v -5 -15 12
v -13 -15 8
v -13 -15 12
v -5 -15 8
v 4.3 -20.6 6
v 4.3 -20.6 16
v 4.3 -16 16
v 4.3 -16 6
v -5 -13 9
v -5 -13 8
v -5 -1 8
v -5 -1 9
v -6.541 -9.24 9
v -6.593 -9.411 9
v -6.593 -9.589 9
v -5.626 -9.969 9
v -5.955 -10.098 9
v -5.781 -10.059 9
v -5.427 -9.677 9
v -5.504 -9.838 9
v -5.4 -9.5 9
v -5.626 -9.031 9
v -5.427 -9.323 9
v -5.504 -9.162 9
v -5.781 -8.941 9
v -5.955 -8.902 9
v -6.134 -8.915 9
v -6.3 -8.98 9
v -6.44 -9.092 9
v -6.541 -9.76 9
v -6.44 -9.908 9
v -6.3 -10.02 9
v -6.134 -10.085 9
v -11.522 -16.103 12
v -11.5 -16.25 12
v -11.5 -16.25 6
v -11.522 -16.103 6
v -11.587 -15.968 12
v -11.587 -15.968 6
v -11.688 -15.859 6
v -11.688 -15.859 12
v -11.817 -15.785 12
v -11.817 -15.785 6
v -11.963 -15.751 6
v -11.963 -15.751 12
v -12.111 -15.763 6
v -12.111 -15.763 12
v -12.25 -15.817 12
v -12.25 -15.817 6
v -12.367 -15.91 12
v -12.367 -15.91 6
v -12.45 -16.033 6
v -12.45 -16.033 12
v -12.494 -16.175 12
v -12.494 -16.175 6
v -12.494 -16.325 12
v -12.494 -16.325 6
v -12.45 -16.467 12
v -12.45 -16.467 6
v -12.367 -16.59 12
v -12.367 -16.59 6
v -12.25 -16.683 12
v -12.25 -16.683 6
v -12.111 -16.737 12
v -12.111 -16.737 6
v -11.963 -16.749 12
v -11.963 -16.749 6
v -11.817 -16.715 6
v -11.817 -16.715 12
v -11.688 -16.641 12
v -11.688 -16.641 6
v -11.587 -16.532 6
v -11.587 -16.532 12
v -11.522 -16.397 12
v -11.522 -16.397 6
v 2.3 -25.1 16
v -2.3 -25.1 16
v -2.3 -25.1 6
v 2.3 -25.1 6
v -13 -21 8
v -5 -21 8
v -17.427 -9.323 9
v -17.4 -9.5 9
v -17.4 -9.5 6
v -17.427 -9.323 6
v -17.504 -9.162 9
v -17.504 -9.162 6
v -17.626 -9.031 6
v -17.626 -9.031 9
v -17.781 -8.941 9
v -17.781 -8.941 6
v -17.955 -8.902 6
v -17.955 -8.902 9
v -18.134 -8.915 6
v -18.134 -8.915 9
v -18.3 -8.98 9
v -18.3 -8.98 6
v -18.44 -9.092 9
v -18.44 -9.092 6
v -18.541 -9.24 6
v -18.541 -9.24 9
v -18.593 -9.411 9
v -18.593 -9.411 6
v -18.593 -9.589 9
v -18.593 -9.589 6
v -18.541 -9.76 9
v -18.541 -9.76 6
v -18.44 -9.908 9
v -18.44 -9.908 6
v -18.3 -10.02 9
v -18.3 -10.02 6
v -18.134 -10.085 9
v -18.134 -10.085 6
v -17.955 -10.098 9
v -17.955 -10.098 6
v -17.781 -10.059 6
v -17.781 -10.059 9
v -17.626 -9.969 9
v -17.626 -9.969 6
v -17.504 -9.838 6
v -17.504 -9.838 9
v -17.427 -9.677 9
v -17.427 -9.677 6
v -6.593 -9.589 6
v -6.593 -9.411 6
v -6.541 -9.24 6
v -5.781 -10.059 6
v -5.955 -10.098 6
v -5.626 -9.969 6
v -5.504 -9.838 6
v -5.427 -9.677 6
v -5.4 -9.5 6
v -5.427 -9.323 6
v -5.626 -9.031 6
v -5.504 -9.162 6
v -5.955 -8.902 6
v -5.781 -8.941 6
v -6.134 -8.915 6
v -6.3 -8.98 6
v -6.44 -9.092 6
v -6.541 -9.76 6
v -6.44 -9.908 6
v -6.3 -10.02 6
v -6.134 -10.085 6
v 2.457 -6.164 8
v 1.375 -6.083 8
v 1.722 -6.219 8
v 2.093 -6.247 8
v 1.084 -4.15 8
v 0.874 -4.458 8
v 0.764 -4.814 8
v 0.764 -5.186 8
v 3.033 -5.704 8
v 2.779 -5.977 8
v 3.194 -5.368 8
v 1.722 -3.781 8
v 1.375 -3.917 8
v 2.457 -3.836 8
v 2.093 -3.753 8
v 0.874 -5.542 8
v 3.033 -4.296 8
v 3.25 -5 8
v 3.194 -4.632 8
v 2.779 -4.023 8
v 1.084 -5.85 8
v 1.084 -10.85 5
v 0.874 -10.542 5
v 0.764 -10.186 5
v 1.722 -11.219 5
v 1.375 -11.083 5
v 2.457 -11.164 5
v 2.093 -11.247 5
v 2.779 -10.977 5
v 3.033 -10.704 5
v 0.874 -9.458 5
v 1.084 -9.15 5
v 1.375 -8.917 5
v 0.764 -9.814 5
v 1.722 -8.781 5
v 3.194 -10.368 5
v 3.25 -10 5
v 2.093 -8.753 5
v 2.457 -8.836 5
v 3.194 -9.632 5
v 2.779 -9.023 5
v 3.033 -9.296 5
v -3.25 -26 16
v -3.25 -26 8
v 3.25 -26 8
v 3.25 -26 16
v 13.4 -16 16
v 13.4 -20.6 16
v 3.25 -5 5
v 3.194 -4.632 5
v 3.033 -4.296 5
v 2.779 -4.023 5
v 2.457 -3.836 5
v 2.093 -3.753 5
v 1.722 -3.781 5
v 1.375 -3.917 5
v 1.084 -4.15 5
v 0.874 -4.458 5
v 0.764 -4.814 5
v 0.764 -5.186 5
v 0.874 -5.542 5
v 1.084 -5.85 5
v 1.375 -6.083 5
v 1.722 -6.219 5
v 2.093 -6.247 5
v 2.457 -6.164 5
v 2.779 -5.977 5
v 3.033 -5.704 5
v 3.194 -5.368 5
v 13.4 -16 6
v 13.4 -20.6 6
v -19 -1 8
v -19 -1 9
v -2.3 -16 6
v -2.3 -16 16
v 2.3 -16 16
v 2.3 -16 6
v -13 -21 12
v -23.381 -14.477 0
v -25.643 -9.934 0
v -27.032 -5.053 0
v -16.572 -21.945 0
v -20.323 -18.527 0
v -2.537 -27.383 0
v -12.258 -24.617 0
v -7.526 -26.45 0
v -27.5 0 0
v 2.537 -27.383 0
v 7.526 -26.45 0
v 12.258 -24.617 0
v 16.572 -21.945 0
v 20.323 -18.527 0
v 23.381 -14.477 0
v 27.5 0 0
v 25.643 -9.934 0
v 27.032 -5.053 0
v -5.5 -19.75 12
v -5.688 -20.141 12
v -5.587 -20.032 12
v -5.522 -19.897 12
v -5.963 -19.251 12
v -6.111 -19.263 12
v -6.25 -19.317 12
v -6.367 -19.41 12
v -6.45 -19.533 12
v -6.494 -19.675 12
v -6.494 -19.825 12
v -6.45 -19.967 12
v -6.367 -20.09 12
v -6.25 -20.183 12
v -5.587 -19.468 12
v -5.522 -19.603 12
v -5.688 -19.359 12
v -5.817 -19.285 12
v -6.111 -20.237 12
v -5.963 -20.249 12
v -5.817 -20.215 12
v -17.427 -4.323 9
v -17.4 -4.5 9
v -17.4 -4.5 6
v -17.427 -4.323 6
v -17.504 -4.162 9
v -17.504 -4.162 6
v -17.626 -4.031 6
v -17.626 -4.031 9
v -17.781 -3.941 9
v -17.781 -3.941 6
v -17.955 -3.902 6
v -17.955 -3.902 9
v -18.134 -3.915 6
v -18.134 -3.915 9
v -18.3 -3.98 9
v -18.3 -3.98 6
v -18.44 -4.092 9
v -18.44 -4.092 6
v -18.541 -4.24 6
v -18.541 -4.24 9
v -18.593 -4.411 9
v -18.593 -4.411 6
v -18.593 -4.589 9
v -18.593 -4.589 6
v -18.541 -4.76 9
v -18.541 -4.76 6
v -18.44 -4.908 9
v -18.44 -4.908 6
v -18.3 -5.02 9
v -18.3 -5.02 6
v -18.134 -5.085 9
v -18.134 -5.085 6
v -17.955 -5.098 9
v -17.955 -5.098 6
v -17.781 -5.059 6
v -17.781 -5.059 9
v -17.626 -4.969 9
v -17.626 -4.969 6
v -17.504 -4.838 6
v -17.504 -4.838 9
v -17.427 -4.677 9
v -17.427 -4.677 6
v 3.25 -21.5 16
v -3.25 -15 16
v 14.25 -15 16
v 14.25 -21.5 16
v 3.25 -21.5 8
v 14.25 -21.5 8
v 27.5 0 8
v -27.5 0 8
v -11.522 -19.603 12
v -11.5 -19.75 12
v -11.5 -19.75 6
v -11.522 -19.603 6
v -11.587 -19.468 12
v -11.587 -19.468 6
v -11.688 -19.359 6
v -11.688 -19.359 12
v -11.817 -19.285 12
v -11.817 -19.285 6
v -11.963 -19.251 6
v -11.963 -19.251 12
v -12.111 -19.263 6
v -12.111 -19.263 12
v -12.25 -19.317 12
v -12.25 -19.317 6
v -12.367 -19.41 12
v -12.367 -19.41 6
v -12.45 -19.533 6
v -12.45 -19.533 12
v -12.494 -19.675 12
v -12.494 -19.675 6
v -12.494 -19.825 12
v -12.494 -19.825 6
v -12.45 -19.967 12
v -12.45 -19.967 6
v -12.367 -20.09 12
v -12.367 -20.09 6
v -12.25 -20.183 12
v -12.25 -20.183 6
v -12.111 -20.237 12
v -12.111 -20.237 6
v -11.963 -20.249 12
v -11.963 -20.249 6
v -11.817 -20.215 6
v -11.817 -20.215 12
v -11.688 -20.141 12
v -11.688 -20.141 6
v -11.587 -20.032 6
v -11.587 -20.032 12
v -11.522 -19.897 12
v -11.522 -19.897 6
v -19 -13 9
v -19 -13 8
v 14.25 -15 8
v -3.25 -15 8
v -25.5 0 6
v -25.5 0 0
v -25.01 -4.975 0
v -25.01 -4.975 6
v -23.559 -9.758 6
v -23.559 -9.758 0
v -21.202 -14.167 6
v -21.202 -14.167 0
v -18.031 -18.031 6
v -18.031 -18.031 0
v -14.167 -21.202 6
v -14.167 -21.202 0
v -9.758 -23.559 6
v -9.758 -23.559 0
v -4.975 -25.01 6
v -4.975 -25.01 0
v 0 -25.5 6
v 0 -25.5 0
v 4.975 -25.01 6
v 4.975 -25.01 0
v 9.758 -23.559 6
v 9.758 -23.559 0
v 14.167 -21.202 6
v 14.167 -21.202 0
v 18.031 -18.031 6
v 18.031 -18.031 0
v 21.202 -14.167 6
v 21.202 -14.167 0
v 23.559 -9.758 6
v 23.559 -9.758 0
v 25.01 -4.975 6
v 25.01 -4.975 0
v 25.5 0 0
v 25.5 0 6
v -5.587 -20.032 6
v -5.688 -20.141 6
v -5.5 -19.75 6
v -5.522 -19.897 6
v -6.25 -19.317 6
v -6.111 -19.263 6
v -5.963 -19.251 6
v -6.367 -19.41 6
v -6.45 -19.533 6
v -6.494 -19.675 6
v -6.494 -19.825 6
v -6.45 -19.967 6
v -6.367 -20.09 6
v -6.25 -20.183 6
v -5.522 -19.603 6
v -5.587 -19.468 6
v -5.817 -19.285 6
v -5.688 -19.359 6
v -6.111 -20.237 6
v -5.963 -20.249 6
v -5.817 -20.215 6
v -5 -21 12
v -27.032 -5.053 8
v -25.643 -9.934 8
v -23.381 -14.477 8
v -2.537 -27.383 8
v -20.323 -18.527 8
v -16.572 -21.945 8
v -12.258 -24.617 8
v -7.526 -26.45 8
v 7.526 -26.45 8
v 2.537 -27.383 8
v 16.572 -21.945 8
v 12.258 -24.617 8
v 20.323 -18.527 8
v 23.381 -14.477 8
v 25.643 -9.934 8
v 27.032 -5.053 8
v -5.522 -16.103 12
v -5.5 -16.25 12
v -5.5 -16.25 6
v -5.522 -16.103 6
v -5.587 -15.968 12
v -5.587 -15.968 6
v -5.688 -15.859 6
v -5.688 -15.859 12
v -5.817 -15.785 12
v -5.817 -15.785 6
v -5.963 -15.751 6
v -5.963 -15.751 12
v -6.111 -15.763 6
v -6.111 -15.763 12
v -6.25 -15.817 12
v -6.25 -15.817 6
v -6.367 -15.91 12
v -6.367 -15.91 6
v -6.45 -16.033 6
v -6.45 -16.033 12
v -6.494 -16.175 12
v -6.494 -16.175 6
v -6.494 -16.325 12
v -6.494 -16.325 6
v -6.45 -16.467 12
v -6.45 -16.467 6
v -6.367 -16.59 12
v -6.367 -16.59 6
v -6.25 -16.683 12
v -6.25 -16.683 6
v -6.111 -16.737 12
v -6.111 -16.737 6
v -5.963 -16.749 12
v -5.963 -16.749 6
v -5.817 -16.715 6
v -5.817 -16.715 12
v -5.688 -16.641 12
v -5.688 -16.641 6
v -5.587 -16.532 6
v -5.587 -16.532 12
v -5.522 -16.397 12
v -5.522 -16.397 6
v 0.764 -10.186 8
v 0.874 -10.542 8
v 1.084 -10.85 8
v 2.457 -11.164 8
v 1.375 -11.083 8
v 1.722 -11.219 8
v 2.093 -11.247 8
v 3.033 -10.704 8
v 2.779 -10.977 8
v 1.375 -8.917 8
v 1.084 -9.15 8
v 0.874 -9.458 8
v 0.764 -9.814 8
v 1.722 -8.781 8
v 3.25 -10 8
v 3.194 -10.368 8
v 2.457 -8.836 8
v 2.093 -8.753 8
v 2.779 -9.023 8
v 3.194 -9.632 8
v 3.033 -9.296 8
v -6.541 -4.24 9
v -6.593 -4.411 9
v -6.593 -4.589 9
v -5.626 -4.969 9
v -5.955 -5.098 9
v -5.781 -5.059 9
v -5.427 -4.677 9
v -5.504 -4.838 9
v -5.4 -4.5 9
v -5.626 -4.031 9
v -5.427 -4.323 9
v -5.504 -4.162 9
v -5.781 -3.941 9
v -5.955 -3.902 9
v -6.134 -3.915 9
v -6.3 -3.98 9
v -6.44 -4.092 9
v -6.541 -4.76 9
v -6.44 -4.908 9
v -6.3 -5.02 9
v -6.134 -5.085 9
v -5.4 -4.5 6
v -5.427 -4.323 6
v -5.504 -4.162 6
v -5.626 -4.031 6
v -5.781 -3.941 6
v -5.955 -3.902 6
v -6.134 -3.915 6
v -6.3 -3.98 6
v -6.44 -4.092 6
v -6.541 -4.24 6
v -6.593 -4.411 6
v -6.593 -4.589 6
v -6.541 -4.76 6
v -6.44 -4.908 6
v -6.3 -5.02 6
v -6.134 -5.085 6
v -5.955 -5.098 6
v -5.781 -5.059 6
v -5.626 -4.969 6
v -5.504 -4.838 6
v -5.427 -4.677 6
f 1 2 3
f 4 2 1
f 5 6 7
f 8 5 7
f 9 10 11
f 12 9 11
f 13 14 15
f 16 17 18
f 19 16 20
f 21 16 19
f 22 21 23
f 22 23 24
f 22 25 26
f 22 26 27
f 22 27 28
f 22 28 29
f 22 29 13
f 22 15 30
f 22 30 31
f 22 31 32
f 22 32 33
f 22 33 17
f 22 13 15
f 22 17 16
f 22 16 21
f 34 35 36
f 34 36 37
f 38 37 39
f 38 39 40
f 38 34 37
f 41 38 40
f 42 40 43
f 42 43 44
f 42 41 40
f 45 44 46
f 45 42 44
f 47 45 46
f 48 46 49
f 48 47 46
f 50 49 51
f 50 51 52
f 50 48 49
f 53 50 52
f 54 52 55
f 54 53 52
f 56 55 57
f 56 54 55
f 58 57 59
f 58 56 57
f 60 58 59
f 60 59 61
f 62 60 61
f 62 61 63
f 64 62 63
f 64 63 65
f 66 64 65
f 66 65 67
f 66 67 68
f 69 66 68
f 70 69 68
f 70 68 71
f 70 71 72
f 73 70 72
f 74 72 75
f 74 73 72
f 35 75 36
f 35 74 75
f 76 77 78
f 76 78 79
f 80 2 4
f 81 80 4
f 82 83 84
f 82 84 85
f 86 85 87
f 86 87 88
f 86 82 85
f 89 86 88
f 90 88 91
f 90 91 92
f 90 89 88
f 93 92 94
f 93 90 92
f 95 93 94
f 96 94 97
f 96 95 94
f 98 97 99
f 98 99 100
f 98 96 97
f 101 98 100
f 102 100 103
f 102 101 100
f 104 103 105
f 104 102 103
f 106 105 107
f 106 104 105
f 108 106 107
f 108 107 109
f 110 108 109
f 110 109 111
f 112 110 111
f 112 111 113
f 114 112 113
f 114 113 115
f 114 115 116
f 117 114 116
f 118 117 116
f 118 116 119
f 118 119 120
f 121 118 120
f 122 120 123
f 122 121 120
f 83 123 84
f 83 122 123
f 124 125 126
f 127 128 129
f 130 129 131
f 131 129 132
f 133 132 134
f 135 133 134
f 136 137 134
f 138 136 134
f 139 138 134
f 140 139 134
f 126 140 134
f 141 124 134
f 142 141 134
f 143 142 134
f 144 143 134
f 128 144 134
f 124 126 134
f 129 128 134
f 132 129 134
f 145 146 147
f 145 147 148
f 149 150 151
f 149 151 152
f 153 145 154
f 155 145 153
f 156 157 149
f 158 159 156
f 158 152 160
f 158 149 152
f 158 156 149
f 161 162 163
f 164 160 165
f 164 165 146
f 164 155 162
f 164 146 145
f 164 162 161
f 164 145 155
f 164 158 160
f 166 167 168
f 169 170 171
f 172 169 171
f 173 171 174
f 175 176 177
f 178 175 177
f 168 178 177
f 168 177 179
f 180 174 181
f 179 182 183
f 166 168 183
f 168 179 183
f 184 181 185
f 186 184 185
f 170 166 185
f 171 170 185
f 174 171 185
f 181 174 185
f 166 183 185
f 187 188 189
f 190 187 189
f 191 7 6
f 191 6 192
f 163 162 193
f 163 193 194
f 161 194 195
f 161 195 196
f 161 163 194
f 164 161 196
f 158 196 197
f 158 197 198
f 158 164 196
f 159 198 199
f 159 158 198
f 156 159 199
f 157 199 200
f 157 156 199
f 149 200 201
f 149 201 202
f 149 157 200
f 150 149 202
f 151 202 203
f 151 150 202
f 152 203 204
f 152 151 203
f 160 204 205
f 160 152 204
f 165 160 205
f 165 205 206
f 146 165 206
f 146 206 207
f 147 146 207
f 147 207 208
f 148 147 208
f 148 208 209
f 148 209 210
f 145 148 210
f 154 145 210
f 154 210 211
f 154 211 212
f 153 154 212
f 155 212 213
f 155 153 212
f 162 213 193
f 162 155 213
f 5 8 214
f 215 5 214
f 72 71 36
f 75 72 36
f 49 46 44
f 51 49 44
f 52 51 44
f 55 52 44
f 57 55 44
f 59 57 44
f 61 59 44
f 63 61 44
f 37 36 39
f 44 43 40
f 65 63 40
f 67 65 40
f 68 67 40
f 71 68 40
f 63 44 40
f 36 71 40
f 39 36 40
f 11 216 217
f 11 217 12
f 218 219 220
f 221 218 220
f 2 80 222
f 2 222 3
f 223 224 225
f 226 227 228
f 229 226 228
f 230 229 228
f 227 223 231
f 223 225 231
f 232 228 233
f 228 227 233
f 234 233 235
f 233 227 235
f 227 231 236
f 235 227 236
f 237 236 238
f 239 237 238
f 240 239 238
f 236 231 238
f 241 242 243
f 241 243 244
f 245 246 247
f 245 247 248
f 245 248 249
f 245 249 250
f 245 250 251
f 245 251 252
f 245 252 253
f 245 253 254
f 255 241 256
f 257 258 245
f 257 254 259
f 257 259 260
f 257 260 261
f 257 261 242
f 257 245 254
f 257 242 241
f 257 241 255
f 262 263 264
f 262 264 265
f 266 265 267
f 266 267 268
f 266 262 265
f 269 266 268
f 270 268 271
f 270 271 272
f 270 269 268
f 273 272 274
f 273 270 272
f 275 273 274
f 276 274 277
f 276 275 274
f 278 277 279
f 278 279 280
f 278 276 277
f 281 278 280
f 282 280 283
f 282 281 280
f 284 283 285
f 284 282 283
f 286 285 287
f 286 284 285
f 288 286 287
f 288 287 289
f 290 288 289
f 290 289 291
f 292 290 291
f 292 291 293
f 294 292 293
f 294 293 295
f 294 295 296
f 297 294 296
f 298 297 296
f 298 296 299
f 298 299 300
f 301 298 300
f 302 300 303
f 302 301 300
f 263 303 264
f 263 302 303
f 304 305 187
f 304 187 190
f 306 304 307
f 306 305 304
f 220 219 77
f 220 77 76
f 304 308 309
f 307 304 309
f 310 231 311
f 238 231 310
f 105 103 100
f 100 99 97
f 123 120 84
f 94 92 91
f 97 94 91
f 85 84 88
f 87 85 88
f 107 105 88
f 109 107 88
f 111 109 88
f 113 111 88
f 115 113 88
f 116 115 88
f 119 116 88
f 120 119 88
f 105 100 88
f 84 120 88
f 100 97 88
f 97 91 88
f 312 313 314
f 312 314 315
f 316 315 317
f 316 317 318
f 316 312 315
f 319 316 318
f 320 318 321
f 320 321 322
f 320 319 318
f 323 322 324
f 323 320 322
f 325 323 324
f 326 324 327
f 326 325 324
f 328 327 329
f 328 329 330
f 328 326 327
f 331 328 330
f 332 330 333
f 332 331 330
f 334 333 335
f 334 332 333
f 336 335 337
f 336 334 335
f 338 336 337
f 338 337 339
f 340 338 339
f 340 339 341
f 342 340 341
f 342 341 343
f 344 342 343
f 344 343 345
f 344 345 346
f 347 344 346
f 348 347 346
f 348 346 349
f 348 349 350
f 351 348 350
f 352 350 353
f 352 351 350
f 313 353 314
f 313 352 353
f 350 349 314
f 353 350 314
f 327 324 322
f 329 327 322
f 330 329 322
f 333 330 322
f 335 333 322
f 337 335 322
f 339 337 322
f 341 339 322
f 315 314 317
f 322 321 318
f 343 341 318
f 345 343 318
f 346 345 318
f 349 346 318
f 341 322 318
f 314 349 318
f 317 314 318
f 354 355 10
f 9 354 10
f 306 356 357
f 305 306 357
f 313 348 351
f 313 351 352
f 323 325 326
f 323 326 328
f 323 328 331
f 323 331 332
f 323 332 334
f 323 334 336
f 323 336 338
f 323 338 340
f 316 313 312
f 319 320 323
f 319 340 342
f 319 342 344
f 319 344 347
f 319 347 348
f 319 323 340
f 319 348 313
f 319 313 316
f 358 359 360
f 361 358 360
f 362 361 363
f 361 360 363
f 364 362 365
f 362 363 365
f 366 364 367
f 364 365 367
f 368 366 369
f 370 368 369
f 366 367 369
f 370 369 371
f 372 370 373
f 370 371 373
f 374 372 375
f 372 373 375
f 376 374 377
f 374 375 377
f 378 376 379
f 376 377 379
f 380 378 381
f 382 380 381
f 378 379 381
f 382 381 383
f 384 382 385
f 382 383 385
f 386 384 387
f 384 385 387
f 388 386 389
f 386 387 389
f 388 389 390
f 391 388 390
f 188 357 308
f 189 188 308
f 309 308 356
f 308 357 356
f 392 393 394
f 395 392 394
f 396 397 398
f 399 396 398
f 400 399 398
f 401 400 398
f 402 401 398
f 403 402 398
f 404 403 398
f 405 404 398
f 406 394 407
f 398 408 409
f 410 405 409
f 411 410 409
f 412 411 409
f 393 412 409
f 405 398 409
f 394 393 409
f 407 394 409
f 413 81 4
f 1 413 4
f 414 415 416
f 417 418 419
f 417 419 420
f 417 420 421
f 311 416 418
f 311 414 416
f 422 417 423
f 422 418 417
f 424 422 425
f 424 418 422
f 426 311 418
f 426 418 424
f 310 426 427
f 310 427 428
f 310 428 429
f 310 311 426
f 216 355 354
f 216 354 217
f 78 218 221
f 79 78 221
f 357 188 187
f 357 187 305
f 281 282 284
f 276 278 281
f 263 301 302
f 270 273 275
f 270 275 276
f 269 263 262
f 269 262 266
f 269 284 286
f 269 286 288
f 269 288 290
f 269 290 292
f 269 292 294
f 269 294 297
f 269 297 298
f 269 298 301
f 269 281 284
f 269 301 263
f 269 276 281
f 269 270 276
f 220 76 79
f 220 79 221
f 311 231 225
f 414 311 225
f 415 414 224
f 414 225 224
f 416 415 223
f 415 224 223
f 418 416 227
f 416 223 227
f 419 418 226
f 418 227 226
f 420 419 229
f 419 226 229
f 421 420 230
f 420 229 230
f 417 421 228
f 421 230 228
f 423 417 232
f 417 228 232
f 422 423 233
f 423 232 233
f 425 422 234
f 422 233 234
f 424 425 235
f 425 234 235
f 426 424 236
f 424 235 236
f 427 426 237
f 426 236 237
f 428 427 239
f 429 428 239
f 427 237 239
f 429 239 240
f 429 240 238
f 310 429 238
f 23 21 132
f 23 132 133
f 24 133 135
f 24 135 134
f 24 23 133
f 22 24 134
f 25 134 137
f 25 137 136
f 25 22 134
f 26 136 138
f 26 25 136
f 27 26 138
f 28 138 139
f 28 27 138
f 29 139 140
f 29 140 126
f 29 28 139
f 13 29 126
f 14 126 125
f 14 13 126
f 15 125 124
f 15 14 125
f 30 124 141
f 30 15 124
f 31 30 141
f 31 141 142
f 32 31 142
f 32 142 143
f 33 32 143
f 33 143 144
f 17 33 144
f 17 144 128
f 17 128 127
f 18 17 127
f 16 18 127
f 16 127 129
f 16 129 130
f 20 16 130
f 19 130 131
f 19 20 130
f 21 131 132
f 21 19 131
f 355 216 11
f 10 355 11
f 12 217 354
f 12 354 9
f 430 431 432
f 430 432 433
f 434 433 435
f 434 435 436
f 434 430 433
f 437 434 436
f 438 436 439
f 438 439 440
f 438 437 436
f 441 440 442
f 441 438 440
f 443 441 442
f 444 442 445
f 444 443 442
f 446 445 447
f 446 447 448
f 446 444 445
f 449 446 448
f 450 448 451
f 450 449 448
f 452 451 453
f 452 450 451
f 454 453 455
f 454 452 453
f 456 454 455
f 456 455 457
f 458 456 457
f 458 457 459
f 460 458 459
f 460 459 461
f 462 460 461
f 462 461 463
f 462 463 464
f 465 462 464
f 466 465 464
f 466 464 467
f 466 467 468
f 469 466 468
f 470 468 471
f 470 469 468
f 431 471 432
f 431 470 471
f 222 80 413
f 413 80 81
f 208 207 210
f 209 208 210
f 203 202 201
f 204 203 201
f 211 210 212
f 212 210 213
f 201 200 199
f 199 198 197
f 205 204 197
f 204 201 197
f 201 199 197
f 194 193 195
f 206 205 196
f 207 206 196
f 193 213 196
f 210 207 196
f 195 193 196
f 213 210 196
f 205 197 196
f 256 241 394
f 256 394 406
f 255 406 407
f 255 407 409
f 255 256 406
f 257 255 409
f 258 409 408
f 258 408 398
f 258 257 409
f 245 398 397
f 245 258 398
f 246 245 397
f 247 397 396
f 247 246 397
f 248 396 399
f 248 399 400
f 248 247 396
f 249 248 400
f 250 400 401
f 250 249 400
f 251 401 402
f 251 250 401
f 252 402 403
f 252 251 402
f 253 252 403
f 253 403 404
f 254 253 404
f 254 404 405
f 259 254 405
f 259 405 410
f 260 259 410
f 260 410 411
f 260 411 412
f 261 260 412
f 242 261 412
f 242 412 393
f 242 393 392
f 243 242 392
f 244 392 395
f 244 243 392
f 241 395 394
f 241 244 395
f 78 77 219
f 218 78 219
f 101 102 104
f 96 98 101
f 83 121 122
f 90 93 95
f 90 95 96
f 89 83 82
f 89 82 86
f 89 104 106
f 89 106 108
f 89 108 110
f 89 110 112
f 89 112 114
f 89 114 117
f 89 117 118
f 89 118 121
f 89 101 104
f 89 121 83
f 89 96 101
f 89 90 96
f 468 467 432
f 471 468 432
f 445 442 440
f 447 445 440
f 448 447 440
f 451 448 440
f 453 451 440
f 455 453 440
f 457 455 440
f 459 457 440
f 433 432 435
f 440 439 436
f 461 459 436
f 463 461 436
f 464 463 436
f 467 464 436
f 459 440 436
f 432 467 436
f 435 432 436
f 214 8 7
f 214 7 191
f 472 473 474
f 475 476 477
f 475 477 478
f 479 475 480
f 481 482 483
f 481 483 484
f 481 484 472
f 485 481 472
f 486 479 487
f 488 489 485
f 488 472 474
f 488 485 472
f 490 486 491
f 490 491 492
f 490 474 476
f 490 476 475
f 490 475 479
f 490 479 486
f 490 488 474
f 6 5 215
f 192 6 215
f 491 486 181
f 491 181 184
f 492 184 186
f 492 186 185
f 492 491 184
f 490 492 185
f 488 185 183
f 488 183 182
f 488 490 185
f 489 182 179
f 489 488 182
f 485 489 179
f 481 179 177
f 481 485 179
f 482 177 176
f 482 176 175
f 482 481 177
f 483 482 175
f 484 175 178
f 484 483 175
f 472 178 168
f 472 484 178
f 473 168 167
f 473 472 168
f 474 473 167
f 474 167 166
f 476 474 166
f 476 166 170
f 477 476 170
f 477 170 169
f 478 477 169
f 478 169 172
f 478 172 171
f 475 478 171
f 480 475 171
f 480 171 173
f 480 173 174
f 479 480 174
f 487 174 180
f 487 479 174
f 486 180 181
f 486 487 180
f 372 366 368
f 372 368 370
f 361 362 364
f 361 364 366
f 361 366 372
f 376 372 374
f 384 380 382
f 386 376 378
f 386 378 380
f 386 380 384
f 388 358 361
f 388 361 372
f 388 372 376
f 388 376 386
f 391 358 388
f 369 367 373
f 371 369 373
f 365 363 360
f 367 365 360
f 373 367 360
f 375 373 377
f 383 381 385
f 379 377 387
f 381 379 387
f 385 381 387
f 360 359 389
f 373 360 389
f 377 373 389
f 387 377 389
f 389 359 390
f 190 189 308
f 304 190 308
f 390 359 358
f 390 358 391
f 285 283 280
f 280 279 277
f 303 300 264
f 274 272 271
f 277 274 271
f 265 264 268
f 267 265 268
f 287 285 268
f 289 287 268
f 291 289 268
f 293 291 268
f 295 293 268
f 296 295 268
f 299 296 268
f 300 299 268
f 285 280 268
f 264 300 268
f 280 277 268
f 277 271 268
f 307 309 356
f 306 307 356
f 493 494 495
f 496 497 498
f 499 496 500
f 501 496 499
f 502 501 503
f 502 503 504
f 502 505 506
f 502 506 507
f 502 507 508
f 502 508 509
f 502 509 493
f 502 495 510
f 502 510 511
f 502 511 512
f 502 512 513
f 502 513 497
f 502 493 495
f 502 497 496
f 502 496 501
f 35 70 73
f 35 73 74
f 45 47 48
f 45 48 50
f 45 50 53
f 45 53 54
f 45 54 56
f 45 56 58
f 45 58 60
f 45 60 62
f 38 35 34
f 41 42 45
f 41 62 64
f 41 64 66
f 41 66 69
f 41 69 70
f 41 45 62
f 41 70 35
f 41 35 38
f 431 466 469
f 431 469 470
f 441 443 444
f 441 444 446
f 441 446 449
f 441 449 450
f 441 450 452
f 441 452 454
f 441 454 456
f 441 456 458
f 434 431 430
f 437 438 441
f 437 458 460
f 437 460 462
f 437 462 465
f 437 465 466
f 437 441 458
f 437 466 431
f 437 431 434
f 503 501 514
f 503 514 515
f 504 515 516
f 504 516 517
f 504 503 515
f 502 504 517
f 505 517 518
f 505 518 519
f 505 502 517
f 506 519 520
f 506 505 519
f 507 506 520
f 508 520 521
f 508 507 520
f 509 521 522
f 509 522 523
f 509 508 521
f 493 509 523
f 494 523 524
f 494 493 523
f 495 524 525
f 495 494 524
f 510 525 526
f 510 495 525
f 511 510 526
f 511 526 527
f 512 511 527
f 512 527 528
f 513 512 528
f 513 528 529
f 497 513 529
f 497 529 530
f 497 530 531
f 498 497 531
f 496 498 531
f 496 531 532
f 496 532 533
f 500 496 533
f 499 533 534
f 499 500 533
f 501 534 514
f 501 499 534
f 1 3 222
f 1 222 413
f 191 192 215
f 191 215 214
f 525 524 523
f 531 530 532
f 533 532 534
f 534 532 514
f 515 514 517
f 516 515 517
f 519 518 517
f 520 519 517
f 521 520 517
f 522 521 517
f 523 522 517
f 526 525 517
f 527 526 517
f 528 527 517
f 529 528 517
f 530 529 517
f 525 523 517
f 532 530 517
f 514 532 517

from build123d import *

# Parameters (mm, degrees)
EXTRUDE_DEPTH    = 8
EXTRUDE001_DEPTH = 6
SKETCH003_W      = 14
SKETCH003_H      = 12
EXTRUDE002_DEPTH = 1
SKETCH006_W      = 11
SKETCH006_H      = 6.5
SKETCH006_W_2    = 6.5
SKETCH006_H_2    = 11
EXTRUDE003_DEPTH = 8
SKETCH005_W      = 8
SKETCH005_H      = 6
EXTRUDE004_DEPTH = 4
SKETCH004_R      = 1.25
EXTRUDE005_DEPTH = 3
SKETCH007_R      = 0.6
EXTRUDE006_DEPTH = 3
SKETCH008_R      = 0.5
EXTRUDE007_DEPTH = 6
SKETCH009_W      = 4.6
SKETCH009_H      = 9.1
SKETCH009_W_2    = 9.1
SKETCH009_H_2    = 4.6
EXTRUDE008_DEPTH = 10


with BuildPart() as body:
    # Sketch001 → Extrude (new body)
    with BuildSketch(Plane.XY):
        with BuildLine():
            ThreePointArc((-27.5, 0), (0, -27.5), (27.5, 0))
            Line((-27.5, 0), (27.5, 0))
        make_face()
    extrude(amount=EXTRUDE_DEPTH)


with BuildPart() as body_cut:
    # Sketch002 → Extrude001 (new body)
    with BuildSketch(Plane.XY):
        with BuildLine():
            ThreePointArc((-25.5, 0), (0, -25.5), (25.5, 0))
            Line((-25.5, 0), (25.5, 0))
        make_face()
    extrude(amount=EXTRUDE001_DEPTH)


with BuildPart() as momentary_button:
    # Sketch003 → Extrude002 (new body)
    with BuildSketch(Plane.XY.offset(8)):
        with Locations((-12, -7)):
            Rectangle(SKETCH003_W, SKETCH003_H)
    extrude(amount=EXTRUDE002_DEPTH)


with BuildPart() as usb_ports001:
    # Sketch006 → Extrude003 (new body)
    with BuildSketch(Plane.XY.offset(8)):
        with Locations((8.75, -18.25)):
            Rectangle(SKETCH006_W, SKETCH006_H)
        with Locations((0, -20.5)):
            Rectangle(SKETCH006_W_2, SKETCH006_H_2)
    extrude(amount=EXTRUDE003_DEPTH)


with BuildPart() as resetbutton001:
    # Sketch005 → Extrude004 (new body)
    with BuildSketch(Plane.XY.offset(8)):
        with Locations((-9, -18)):
            Rectangle(SKETCH005_W, SKETCH005_H)
    extrude(amount=EXTRUDE004_DEPTH)


with BuildPart() as powerbuttonleads:
    # Sketch004 → Extrude005 (new body)
    with BuildSketch(Plane.XY.offset(8)):
        with Locations((2, -10)):
            Circle(SKETCH004_R)
        with Locations((2, -5)):
            Circle(SKETCH004_R)
    extrude(amount=-EXTRUDE005_DEPTH)


with BuildPart() as momentary_leads:
    # Sketch007 → Extrude006 (new body)
    with BuildSketch(Plane.XY.offset(9)):
        with Locations((-18, -9.5)):
            Circle(SKETCH007_R)
        with Locations((-18, -4.5)):
            Circle(SKETCH007_R)
        with Locations((-6, -9.5)):
            Circle(SKETCH007_R)
        with Locations((-6, -4.5)):
            Circle(SKETCH007_R)
    extrude(amount=-EXTRUDE006_DEPTH)


with BuildPart() as reset_leads:
    # Sketch008 → Extrude007 (new body)
    with BuildSketch(Plane.XY.offset(12)):
        with Locations((-12, -16.25)):
            Circle(SKETCH008_R)
        with Locations((-6, -19.75)):
            Circle(SKETCH008_R)
        with Locations((-6, -16.25)):
            Circle(SKETCH008_R)
        with Locations((-12, -19.75)):
            Circle(SKETCH008_R)
    extrude(amount=-EXTRUDE007_DEPTH)


with BuildPart() as extrude008:
    # Sketch009 → Extrude008 (new body)
    with BuildSketch(Plane.XY.offset(16)):
        with Locations((0, -20.55)):
            Rectangle(SKETCH009_W, SKETCH009_H)
        with Locations((8.85, -18.3)):
            Rectangle(SKETCH009_W_2, SKETCH009_H_2)
    extrude(amount=-EXTRUDE008_DEPTH)


solid = Compound([body.part, body_cut.part, momentary_button.part, usb_ports001.part, resetbutton001.part, powerbuttonleads.part, momentary_leads.part, reset_leads.part, extrude008.part])
